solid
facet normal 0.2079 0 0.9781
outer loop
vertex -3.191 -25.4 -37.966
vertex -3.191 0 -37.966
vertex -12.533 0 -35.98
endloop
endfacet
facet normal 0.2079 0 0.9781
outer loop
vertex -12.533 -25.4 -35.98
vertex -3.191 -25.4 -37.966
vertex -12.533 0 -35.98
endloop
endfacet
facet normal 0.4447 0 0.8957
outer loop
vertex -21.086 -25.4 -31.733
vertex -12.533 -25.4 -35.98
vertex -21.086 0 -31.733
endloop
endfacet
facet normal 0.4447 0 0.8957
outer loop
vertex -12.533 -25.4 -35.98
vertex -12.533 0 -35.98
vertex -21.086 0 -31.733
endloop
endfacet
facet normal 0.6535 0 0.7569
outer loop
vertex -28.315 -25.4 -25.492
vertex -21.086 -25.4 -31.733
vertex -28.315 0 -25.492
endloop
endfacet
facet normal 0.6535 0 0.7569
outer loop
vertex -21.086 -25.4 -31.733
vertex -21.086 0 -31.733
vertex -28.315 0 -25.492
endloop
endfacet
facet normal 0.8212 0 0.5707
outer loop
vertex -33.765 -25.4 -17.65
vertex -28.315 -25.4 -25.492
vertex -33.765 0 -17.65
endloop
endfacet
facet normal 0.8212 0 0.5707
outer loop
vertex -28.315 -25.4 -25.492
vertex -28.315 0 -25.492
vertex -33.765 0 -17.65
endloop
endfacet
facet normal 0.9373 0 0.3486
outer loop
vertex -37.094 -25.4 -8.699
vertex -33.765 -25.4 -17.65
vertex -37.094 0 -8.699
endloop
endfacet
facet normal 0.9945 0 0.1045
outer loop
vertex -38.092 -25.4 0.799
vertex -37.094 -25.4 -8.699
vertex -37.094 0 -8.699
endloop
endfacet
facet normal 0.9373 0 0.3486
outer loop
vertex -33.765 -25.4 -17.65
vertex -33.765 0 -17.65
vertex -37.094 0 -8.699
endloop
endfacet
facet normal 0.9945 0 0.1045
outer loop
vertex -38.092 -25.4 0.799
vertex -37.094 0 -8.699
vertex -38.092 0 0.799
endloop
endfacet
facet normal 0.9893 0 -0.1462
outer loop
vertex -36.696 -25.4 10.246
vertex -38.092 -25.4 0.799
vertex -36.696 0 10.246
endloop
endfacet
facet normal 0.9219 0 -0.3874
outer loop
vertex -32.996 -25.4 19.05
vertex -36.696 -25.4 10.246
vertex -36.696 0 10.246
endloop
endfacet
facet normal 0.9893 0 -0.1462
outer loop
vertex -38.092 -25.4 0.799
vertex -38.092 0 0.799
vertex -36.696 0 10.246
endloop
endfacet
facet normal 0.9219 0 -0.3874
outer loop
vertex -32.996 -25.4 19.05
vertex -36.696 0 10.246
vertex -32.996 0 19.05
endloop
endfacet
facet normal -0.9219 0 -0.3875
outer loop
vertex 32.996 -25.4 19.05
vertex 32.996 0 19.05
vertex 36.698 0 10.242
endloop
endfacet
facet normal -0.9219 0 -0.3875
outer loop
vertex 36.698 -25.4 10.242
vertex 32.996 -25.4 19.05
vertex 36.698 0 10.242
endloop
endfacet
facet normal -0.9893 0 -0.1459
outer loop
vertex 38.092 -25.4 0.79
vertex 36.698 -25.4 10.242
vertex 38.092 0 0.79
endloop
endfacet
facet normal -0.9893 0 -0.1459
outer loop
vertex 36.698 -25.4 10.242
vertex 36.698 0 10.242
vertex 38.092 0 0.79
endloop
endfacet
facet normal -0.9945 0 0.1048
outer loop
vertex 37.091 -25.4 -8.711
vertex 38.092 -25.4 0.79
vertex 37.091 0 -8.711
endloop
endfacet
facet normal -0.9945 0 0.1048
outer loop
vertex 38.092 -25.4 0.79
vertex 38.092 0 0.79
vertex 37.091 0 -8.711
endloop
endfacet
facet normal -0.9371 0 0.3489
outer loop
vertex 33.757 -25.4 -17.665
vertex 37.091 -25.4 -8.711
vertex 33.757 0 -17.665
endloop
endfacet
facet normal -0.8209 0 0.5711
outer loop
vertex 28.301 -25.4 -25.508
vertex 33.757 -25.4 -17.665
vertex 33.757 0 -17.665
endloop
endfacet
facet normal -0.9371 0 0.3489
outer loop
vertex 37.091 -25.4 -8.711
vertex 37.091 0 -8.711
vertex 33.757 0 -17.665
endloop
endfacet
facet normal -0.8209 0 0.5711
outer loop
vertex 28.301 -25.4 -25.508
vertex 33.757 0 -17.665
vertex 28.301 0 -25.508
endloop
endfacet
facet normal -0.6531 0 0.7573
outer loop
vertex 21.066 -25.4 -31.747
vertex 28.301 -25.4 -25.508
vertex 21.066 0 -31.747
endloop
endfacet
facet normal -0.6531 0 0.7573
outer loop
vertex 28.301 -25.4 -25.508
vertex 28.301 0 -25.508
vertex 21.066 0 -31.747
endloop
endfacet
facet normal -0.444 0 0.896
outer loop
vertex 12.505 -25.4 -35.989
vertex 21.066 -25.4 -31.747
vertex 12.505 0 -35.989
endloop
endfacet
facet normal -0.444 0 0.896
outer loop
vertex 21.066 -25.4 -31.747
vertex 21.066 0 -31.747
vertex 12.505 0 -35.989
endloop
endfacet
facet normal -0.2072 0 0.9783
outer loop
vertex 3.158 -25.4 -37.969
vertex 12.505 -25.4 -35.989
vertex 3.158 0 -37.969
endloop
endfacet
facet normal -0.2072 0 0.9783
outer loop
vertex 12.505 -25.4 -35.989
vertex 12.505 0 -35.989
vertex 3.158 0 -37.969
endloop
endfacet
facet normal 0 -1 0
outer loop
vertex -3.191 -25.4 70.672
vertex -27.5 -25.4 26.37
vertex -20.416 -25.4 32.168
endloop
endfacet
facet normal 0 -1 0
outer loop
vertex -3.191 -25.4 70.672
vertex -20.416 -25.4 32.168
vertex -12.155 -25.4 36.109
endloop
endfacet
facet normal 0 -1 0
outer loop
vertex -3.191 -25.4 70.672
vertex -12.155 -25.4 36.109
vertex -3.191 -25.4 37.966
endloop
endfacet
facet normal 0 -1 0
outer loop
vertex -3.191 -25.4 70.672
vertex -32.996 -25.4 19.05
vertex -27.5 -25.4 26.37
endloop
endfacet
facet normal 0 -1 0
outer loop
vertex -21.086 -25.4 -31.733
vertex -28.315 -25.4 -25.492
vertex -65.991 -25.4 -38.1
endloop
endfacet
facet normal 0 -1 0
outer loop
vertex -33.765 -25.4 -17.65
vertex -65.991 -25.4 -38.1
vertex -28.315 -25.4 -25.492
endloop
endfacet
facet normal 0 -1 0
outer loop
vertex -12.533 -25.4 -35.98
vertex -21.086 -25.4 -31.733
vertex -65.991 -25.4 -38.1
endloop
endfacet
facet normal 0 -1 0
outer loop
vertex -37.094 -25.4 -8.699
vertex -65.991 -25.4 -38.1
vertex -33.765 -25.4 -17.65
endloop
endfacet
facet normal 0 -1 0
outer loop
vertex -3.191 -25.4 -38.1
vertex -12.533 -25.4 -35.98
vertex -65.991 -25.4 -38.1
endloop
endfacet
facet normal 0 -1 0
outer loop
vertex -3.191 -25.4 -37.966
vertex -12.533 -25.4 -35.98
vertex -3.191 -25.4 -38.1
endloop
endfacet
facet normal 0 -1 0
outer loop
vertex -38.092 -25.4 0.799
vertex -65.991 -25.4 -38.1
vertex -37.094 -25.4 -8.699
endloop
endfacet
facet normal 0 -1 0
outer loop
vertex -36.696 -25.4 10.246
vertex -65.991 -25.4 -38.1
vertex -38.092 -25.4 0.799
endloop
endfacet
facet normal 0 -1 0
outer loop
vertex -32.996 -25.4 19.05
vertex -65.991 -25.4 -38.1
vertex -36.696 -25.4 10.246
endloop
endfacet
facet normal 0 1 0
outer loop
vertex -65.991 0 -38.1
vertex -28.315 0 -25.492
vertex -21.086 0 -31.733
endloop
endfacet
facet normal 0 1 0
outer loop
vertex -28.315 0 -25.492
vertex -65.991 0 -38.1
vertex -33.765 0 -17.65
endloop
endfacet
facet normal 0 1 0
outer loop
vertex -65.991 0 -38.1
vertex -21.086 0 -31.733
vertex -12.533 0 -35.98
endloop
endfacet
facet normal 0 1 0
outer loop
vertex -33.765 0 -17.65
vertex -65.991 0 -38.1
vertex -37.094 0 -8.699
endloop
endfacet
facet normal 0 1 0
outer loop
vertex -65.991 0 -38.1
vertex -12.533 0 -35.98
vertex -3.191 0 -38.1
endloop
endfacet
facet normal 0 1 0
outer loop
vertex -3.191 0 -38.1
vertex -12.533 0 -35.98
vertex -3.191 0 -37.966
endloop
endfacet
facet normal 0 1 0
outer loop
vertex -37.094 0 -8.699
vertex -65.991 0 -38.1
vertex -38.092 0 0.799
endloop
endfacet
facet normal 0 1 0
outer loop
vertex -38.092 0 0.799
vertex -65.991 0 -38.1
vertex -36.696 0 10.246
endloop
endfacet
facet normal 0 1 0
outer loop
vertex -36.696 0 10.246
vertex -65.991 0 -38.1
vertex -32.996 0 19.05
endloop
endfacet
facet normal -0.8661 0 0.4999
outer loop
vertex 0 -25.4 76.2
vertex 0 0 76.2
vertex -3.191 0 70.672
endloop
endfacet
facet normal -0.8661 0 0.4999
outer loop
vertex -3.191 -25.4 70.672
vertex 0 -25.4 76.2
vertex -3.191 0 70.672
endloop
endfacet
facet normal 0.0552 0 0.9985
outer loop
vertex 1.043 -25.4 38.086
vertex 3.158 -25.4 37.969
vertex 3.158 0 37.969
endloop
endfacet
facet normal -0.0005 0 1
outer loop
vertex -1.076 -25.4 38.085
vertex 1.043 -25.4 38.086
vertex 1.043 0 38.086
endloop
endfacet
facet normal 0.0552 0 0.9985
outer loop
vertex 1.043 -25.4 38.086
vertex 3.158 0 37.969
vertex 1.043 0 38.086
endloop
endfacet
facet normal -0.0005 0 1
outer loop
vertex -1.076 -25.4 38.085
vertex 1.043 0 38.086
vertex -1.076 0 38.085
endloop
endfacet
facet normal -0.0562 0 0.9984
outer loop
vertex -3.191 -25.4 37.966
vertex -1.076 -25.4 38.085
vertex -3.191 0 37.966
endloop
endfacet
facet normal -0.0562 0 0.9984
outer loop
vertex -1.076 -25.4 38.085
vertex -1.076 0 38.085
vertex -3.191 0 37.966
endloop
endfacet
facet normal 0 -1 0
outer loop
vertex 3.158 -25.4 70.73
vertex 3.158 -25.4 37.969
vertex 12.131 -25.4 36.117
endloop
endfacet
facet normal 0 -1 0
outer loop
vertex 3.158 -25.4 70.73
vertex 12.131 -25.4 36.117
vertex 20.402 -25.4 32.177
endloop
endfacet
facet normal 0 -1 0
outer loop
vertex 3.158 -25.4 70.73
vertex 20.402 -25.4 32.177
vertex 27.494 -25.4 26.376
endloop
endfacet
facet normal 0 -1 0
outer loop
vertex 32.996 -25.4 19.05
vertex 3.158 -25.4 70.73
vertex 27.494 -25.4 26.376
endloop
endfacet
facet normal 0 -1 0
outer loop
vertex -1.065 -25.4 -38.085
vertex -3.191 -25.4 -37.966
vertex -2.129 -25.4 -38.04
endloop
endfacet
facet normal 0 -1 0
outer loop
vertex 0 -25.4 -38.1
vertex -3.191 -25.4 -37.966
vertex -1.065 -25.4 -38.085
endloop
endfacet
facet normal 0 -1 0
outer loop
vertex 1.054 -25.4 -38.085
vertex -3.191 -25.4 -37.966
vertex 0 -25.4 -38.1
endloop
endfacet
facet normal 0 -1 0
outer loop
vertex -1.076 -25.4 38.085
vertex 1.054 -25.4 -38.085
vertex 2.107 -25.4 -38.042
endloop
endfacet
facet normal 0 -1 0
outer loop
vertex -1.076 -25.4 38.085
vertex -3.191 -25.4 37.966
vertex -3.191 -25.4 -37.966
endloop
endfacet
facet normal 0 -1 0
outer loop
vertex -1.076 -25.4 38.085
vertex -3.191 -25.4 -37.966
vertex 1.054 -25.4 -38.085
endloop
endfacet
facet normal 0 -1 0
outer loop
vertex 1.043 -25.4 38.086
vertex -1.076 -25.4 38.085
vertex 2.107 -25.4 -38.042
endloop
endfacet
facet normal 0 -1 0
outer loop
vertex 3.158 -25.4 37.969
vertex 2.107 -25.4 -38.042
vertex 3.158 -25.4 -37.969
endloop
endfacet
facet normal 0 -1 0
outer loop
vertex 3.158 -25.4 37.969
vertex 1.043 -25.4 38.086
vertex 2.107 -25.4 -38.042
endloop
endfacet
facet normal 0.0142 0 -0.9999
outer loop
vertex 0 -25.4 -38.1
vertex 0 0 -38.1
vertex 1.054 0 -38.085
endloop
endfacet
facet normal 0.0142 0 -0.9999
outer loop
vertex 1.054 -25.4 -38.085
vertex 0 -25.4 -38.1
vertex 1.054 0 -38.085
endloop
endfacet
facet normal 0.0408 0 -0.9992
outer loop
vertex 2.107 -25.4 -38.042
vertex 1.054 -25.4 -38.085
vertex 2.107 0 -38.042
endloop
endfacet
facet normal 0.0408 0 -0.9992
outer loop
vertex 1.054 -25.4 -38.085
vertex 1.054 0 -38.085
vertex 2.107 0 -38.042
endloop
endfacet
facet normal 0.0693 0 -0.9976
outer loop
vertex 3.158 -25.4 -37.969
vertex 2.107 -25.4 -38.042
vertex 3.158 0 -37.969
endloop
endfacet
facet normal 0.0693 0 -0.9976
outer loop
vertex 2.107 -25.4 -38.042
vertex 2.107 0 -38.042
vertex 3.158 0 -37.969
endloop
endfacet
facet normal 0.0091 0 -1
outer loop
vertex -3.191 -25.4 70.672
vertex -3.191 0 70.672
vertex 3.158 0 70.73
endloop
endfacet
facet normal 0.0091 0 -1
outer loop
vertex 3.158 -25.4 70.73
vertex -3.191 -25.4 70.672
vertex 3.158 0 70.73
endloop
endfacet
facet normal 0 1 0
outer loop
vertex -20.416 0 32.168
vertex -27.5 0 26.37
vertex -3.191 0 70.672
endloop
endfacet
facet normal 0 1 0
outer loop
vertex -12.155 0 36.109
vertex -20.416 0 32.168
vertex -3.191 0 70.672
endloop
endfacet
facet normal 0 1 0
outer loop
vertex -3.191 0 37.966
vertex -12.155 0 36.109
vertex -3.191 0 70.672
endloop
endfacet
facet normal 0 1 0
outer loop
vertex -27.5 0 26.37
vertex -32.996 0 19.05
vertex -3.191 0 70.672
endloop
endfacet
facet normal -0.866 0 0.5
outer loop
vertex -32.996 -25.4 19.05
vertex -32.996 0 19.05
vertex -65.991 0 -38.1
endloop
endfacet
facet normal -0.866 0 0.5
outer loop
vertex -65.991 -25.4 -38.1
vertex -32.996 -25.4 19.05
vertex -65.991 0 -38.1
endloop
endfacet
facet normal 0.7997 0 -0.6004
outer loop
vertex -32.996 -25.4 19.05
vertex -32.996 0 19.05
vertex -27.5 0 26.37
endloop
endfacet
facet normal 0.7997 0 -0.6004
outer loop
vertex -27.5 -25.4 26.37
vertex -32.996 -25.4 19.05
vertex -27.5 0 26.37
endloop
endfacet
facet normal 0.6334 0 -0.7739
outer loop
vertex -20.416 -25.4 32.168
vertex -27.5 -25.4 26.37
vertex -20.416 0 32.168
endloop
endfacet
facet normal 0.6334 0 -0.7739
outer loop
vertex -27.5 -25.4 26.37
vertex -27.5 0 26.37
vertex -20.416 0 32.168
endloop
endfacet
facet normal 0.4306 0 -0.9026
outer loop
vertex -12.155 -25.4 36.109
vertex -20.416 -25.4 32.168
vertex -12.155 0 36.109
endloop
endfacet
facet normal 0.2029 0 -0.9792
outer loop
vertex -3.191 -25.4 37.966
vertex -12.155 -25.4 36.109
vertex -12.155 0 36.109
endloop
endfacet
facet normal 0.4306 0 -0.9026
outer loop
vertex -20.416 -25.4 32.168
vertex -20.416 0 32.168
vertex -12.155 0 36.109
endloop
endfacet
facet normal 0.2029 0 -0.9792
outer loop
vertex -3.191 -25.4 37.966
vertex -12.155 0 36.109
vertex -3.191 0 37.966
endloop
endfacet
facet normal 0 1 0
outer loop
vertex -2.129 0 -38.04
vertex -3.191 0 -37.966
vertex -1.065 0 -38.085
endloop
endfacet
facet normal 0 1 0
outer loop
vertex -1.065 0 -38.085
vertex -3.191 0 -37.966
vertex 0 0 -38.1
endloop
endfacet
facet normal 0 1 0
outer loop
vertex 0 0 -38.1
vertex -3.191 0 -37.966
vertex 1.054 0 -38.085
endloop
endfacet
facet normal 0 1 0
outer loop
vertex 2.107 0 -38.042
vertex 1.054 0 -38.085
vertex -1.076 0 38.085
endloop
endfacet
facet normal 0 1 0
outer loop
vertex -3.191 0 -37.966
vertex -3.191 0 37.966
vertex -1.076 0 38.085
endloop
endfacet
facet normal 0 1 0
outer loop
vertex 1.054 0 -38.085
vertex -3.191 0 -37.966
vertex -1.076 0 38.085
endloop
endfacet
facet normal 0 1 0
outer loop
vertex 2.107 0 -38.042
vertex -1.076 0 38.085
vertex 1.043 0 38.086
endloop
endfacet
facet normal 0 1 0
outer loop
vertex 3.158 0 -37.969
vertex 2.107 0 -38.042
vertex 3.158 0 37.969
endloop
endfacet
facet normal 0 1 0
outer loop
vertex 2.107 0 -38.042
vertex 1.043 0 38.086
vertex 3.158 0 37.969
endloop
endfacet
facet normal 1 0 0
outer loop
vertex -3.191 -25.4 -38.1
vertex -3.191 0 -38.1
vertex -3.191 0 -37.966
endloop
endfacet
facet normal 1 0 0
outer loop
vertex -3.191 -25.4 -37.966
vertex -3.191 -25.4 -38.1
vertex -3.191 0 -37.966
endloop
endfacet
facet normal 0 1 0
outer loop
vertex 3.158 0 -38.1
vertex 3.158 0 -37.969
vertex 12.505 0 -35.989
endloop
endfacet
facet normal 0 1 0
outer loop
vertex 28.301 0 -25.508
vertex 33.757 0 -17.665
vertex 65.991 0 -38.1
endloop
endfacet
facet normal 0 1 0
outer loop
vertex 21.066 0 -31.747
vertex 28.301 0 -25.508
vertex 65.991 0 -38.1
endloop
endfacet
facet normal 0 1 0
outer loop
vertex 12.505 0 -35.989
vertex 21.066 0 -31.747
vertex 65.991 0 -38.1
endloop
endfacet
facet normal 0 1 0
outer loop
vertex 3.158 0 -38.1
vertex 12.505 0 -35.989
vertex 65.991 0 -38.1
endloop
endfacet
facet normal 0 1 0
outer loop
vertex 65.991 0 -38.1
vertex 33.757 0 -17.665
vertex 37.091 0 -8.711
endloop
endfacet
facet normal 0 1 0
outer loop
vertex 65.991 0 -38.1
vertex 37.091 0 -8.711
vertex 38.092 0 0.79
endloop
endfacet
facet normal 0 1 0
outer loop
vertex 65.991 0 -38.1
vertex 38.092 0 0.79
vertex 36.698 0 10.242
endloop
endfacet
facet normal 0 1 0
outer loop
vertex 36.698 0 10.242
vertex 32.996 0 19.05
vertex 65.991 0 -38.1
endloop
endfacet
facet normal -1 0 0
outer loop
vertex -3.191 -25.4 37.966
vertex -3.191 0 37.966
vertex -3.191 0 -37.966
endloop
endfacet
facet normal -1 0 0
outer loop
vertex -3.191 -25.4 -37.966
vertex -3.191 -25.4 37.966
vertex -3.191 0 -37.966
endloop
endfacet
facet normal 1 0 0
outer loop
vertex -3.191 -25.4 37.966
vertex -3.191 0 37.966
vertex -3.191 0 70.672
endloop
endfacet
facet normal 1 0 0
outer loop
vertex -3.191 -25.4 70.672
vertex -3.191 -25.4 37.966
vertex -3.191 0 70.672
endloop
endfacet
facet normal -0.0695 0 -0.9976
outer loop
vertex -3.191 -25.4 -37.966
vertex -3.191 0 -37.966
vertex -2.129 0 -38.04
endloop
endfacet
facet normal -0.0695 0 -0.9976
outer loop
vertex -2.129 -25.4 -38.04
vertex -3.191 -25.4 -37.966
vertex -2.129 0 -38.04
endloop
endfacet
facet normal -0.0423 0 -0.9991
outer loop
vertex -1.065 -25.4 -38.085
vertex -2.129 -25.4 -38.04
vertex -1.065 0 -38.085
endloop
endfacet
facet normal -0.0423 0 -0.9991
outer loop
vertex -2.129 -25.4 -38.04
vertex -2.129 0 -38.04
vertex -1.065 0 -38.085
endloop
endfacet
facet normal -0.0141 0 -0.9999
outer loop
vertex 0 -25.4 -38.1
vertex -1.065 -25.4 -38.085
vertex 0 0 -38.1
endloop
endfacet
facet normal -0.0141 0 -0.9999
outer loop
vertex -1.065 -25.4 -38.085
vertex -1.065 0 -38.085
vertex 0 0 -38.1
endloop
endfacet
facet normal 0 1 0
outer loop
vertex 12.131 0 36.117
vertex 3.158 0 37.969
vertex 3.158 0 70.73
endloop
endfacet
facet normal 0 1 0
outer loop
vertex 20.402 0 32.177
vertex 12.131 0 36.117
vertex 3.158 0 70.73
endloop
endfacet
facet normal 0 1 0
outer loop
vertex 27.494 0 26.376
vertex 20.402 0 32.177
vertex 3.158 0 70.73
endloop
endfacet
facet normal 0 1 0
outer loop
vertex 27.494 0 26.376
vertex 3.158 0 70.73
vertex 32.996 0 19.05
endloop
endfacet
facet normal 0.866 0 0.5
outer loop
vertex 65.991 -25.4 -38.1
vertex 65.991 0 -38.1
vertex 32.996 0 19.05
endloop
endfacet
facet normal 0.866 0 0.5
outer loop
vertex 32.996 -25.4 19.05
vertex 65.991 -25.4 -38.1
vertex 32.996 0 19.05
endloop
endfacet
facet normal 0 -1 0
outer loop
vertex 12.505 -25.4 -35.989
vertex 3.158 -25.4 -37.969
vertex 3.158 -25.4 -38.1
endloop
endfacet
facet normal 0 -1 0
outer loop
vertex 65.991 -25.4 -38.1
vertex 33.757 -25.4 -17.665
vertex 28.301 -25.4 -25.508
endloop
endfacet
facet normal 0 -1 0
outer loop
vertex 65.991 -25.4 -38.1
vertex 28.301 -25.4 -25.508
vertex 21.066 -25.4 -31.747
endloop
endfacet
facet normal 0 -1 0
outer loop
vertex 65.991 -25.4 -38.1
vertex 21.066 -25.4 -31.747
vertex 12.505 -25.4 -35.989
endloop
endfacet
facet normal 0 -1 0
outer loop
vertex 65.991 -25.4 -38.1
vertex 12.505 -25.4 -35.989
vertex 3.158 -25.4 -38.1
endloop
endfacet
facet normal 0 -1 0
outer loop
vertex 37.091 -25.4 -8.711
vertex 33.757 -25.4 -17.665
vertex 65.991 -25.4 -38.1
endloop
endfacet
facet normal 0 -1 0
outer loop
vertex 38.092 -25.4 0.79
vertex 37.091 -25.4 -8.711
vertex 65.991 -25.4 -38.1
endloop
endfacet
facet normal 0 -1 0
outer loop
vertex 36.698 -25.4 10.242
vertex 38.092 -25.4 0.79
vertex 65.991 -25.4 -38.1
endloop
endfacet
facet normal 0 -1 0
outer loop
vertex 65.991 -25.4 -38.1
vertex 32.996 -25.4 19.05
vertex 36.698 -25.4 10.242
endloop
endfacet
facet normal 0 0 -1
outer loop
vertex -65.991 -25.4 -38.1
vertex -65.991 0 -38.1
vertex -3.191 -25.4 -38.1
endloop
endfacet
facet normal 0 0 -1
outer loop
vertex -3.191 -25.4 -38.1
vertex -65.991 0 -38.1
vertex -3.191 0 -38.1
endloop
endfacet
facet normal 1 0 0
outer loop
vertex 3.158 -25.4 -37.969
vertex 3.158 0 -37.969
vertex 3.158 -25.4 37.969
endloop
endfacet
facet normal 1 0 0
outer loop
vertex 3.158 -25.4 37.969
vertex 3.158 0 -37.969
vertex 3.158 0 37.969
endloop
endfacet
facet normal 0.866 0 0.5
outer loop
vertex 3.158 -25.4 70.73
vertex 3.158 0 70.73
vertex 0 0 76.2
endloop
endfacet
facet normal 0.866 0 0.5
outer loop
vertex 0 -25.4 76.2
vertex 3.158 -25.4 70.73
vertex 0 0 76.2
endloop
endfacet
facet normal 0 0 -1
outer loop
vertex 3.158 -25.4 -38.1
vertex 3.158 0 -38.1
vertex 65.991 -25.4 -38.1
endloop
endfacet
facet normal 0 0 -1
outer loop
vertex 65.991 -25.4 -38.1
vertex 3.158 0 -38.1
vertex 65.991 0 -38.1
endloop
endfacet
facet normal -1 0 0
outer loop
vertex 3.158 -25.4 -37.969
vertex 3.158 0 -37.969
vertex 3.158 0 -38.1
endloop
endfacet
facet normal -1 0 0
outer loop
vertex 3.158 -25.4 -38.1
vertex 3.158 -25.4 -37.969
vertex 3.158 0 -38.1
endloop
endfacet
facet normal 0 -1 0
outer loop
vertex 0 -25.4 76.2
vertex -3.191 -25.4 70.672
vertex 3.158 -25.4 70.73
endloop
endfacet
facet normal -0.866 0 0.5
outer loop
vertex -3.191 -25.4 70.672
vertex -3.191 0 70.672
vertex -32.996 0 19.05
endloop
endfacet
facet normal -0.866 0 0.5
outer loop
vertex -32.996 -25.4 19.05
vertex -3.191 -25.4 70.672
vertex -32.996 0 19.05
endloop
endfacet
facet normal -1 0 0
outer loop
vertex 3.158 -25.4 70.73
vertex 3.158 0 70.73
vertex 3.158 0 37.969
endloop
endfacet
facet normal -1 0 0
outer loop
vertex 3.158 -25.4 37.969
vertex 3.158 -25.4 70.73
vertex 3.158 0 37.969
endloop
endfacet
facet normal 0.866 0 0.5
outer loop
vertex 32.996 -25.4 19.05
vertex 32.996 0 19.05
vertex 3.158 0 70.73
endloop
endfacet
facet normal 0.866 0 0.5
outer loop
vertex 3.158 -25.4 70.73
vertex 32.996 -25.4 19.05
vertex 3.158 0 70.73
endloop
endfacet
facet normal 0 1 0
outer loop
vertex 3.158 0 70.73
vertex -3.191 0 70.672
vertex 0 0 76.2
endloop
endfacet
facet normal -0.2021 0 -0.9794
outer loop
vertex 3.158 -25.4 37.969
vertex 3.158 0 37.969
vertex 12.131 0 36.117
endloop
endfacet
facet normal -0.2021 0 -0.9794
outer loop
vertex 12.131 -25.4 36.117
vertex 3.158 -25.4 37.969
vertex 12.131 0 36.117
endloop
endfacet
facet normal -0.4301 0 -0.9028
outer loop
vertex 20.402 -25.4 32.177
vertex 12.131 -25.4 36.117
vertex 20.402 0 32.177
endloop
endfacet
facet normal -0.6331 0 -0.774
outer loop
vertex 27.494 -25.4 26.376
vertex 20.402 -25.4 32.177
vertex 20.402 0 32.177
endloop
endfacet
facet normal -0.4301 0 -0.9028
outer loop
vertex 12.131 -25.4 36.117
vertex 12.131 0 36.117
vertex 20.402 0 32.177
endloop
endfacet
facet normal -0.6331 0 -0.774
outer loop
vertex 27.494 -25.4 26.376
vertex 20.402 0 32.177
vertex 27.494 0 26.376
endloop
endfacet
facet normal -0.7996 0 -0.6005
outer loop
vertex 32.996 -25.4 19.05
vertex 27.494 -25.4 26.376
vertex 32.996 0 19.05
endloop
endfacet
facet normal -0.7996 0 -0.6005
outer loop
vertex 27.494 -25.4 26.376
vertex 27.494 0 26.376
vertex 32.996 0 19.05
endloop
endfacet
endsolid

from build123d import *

# Parameters (mm, degrees)
F1_DEPTH = 25.4


with BuildPart() as f1:
    # F0 (on Front) → F1 (new body)
    with BuildSketch(Plane.XZ):
        Polygon((-3.1914482743, 70.6722494391), (3.1582920346, 70.7296777309), (0, 76.2), align=None)
    extrude(amount=F1_DEPTH)


with BuildPart() as f1b:
    # F0 (on Front) → F1, piece 2 (new body)
    with BuildSketch(Plane.XZ):
        with BuildLine():
            ThreePointArc((-32.9955673517, 19.0500009224), (-20.4164079771, 32.168000953), (-3.1914482743, 37.9660987976))
            Line((-3.1914482743, 37.9660987976), (-3.1914482743, 70.6722494391))
            Line((-3.1914482743, 70.6722494391), (-32.9955673517, 19.0500009224))
        make_face()
    extrude(amount=F1_DEPTH)


with BuildPart() as f1c:
    # F0 (on Front) → F1, piece 3 (new body)
    with BuildSketch(Plane.XZ):
        with BuildLine():
            ThreePointArc((3.1582920346, 37.9688713478), (20.4023610122, 32.1769119887), (32.995568315, 19.0499992538))
            Line((32.995568315, 19.0499992538), (3.1582920346, 70.7296777309))
            Line((3.1582920346, 70.7296777309), (3.1582920346, 37.9688713478))
        make_face()
    extrude(amount=F1_DEPTH)


with BuildPart() as f1d:
    # F0 (on Front) → F1, piece 4 (new body)
    with BuildSketch(Plane.XZ):
        with BuildLine():
            ThreePointArc((4.21e-08, -38.1), (1.58050653, -38.0672037206), (3.1582920346, -37.9688713478))
            Line((3.1582920346, -37.9688713478), (3.1582920346, 37.9688713478))
            ThreePointArc((3.1582920346, 37.9688713478), (-0.0166359796, 38.099996368), (-3.1914482743, 37.9660987976))
            Line((-3.1914482743, 37.9660987976), (-3.1914482743, -37.9660987976))
            ThreePointArc((-3.1914482743, -37.9660987976), (-1.5971279966, -38.0665099814), (4.21e-08, -38.1))
        make_face()
    extrude(amount=F1_DEPTH)


with BuildPart() as f1e:
    # F0 (on Front) → F1, piece 5 (new body)
    with BuildSketch(Plane.XZ):
        with BuildLine():
            Line((-3.1914482743, -38.1), (-3.1914482743, -37.9660987976))
            ThreePointArc((-3.1914482743, -37.9660987976), (-33.7651289321, -17.6501010819), (-32.9955673517, 19.0500009224))
            Line((-32.9955673517, 19.0500009224), (-65.9911357684, -38.1))
            Line((-65.9911357684, -38.1), (-3.1914482743, -38.1))
        make_face()
    extrude(amount=F1_DEPTH)


with BuildPart() as f1f:
    # F0 (on Front) → F1, piece 6 (new body)
    with BuildSketch(Plane.XZ):
        with BuildLine():
            ThreePointArc((32.995568315, 19.0499992538), (36.8017740931, 9.8610052023), (38.1, 0))
            ThreePointArc((38.1, 0), (28.0351647625, -25.7999910221), (3.1582920346, -37.9688713478))
            Line((3.1582920346, -37.9688713478), (3.1582920346, -38.1))
            Line((3.1582920346, -38.1), (65.9911357684, -38.1))
            Line((65.9911357684, -38.1), (32.995568315, 19.0499992538))
        make_face()
    extrude(amount=F1_DEPTH)


solid = Compound([f1.part, f1b.part, f1c.part, f1d.part, f1e.part, f1f.part])
